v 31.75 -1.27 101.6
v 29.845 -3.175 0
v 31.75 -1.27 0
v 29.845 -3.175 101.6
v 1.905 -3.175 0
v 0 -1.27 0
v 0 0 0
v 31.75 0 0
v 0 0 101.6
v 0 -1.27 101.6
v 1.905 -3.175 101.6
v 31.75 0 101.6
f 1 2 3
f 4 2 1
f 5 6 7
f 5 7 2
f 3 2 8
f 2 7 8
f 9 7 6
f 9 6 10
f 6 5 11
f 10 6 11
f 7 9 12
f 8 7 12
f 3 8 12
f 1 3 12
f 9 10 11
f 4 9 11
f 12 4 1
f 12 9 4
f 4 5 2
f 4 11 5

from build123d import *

# Parameters (mm, degrees)
F0_W     = 31.75
F0_H     = 101.6
F1_DEPTH = 3.175
F2_SIZE  = 1.905


with BuildPart() as f1:
    # F0 (on Front) → F1 (new body)
    with BuildSketch(Plane.XZ):
        with Locations((15.875, 50.8)):
            Rectangle(F0_W, F0_H)
    extrude(amount=F1_DEPTH)

    # F2
    f2_edges = [f1.edges().sort_by_distance(p)[0] for p in [
        (0, -3.175, 50.8),
        (31.75, -3.175, 50.8),
    ]]
    chamfer(f2_edges, length=F2_SIZE)


solid = f1.part
